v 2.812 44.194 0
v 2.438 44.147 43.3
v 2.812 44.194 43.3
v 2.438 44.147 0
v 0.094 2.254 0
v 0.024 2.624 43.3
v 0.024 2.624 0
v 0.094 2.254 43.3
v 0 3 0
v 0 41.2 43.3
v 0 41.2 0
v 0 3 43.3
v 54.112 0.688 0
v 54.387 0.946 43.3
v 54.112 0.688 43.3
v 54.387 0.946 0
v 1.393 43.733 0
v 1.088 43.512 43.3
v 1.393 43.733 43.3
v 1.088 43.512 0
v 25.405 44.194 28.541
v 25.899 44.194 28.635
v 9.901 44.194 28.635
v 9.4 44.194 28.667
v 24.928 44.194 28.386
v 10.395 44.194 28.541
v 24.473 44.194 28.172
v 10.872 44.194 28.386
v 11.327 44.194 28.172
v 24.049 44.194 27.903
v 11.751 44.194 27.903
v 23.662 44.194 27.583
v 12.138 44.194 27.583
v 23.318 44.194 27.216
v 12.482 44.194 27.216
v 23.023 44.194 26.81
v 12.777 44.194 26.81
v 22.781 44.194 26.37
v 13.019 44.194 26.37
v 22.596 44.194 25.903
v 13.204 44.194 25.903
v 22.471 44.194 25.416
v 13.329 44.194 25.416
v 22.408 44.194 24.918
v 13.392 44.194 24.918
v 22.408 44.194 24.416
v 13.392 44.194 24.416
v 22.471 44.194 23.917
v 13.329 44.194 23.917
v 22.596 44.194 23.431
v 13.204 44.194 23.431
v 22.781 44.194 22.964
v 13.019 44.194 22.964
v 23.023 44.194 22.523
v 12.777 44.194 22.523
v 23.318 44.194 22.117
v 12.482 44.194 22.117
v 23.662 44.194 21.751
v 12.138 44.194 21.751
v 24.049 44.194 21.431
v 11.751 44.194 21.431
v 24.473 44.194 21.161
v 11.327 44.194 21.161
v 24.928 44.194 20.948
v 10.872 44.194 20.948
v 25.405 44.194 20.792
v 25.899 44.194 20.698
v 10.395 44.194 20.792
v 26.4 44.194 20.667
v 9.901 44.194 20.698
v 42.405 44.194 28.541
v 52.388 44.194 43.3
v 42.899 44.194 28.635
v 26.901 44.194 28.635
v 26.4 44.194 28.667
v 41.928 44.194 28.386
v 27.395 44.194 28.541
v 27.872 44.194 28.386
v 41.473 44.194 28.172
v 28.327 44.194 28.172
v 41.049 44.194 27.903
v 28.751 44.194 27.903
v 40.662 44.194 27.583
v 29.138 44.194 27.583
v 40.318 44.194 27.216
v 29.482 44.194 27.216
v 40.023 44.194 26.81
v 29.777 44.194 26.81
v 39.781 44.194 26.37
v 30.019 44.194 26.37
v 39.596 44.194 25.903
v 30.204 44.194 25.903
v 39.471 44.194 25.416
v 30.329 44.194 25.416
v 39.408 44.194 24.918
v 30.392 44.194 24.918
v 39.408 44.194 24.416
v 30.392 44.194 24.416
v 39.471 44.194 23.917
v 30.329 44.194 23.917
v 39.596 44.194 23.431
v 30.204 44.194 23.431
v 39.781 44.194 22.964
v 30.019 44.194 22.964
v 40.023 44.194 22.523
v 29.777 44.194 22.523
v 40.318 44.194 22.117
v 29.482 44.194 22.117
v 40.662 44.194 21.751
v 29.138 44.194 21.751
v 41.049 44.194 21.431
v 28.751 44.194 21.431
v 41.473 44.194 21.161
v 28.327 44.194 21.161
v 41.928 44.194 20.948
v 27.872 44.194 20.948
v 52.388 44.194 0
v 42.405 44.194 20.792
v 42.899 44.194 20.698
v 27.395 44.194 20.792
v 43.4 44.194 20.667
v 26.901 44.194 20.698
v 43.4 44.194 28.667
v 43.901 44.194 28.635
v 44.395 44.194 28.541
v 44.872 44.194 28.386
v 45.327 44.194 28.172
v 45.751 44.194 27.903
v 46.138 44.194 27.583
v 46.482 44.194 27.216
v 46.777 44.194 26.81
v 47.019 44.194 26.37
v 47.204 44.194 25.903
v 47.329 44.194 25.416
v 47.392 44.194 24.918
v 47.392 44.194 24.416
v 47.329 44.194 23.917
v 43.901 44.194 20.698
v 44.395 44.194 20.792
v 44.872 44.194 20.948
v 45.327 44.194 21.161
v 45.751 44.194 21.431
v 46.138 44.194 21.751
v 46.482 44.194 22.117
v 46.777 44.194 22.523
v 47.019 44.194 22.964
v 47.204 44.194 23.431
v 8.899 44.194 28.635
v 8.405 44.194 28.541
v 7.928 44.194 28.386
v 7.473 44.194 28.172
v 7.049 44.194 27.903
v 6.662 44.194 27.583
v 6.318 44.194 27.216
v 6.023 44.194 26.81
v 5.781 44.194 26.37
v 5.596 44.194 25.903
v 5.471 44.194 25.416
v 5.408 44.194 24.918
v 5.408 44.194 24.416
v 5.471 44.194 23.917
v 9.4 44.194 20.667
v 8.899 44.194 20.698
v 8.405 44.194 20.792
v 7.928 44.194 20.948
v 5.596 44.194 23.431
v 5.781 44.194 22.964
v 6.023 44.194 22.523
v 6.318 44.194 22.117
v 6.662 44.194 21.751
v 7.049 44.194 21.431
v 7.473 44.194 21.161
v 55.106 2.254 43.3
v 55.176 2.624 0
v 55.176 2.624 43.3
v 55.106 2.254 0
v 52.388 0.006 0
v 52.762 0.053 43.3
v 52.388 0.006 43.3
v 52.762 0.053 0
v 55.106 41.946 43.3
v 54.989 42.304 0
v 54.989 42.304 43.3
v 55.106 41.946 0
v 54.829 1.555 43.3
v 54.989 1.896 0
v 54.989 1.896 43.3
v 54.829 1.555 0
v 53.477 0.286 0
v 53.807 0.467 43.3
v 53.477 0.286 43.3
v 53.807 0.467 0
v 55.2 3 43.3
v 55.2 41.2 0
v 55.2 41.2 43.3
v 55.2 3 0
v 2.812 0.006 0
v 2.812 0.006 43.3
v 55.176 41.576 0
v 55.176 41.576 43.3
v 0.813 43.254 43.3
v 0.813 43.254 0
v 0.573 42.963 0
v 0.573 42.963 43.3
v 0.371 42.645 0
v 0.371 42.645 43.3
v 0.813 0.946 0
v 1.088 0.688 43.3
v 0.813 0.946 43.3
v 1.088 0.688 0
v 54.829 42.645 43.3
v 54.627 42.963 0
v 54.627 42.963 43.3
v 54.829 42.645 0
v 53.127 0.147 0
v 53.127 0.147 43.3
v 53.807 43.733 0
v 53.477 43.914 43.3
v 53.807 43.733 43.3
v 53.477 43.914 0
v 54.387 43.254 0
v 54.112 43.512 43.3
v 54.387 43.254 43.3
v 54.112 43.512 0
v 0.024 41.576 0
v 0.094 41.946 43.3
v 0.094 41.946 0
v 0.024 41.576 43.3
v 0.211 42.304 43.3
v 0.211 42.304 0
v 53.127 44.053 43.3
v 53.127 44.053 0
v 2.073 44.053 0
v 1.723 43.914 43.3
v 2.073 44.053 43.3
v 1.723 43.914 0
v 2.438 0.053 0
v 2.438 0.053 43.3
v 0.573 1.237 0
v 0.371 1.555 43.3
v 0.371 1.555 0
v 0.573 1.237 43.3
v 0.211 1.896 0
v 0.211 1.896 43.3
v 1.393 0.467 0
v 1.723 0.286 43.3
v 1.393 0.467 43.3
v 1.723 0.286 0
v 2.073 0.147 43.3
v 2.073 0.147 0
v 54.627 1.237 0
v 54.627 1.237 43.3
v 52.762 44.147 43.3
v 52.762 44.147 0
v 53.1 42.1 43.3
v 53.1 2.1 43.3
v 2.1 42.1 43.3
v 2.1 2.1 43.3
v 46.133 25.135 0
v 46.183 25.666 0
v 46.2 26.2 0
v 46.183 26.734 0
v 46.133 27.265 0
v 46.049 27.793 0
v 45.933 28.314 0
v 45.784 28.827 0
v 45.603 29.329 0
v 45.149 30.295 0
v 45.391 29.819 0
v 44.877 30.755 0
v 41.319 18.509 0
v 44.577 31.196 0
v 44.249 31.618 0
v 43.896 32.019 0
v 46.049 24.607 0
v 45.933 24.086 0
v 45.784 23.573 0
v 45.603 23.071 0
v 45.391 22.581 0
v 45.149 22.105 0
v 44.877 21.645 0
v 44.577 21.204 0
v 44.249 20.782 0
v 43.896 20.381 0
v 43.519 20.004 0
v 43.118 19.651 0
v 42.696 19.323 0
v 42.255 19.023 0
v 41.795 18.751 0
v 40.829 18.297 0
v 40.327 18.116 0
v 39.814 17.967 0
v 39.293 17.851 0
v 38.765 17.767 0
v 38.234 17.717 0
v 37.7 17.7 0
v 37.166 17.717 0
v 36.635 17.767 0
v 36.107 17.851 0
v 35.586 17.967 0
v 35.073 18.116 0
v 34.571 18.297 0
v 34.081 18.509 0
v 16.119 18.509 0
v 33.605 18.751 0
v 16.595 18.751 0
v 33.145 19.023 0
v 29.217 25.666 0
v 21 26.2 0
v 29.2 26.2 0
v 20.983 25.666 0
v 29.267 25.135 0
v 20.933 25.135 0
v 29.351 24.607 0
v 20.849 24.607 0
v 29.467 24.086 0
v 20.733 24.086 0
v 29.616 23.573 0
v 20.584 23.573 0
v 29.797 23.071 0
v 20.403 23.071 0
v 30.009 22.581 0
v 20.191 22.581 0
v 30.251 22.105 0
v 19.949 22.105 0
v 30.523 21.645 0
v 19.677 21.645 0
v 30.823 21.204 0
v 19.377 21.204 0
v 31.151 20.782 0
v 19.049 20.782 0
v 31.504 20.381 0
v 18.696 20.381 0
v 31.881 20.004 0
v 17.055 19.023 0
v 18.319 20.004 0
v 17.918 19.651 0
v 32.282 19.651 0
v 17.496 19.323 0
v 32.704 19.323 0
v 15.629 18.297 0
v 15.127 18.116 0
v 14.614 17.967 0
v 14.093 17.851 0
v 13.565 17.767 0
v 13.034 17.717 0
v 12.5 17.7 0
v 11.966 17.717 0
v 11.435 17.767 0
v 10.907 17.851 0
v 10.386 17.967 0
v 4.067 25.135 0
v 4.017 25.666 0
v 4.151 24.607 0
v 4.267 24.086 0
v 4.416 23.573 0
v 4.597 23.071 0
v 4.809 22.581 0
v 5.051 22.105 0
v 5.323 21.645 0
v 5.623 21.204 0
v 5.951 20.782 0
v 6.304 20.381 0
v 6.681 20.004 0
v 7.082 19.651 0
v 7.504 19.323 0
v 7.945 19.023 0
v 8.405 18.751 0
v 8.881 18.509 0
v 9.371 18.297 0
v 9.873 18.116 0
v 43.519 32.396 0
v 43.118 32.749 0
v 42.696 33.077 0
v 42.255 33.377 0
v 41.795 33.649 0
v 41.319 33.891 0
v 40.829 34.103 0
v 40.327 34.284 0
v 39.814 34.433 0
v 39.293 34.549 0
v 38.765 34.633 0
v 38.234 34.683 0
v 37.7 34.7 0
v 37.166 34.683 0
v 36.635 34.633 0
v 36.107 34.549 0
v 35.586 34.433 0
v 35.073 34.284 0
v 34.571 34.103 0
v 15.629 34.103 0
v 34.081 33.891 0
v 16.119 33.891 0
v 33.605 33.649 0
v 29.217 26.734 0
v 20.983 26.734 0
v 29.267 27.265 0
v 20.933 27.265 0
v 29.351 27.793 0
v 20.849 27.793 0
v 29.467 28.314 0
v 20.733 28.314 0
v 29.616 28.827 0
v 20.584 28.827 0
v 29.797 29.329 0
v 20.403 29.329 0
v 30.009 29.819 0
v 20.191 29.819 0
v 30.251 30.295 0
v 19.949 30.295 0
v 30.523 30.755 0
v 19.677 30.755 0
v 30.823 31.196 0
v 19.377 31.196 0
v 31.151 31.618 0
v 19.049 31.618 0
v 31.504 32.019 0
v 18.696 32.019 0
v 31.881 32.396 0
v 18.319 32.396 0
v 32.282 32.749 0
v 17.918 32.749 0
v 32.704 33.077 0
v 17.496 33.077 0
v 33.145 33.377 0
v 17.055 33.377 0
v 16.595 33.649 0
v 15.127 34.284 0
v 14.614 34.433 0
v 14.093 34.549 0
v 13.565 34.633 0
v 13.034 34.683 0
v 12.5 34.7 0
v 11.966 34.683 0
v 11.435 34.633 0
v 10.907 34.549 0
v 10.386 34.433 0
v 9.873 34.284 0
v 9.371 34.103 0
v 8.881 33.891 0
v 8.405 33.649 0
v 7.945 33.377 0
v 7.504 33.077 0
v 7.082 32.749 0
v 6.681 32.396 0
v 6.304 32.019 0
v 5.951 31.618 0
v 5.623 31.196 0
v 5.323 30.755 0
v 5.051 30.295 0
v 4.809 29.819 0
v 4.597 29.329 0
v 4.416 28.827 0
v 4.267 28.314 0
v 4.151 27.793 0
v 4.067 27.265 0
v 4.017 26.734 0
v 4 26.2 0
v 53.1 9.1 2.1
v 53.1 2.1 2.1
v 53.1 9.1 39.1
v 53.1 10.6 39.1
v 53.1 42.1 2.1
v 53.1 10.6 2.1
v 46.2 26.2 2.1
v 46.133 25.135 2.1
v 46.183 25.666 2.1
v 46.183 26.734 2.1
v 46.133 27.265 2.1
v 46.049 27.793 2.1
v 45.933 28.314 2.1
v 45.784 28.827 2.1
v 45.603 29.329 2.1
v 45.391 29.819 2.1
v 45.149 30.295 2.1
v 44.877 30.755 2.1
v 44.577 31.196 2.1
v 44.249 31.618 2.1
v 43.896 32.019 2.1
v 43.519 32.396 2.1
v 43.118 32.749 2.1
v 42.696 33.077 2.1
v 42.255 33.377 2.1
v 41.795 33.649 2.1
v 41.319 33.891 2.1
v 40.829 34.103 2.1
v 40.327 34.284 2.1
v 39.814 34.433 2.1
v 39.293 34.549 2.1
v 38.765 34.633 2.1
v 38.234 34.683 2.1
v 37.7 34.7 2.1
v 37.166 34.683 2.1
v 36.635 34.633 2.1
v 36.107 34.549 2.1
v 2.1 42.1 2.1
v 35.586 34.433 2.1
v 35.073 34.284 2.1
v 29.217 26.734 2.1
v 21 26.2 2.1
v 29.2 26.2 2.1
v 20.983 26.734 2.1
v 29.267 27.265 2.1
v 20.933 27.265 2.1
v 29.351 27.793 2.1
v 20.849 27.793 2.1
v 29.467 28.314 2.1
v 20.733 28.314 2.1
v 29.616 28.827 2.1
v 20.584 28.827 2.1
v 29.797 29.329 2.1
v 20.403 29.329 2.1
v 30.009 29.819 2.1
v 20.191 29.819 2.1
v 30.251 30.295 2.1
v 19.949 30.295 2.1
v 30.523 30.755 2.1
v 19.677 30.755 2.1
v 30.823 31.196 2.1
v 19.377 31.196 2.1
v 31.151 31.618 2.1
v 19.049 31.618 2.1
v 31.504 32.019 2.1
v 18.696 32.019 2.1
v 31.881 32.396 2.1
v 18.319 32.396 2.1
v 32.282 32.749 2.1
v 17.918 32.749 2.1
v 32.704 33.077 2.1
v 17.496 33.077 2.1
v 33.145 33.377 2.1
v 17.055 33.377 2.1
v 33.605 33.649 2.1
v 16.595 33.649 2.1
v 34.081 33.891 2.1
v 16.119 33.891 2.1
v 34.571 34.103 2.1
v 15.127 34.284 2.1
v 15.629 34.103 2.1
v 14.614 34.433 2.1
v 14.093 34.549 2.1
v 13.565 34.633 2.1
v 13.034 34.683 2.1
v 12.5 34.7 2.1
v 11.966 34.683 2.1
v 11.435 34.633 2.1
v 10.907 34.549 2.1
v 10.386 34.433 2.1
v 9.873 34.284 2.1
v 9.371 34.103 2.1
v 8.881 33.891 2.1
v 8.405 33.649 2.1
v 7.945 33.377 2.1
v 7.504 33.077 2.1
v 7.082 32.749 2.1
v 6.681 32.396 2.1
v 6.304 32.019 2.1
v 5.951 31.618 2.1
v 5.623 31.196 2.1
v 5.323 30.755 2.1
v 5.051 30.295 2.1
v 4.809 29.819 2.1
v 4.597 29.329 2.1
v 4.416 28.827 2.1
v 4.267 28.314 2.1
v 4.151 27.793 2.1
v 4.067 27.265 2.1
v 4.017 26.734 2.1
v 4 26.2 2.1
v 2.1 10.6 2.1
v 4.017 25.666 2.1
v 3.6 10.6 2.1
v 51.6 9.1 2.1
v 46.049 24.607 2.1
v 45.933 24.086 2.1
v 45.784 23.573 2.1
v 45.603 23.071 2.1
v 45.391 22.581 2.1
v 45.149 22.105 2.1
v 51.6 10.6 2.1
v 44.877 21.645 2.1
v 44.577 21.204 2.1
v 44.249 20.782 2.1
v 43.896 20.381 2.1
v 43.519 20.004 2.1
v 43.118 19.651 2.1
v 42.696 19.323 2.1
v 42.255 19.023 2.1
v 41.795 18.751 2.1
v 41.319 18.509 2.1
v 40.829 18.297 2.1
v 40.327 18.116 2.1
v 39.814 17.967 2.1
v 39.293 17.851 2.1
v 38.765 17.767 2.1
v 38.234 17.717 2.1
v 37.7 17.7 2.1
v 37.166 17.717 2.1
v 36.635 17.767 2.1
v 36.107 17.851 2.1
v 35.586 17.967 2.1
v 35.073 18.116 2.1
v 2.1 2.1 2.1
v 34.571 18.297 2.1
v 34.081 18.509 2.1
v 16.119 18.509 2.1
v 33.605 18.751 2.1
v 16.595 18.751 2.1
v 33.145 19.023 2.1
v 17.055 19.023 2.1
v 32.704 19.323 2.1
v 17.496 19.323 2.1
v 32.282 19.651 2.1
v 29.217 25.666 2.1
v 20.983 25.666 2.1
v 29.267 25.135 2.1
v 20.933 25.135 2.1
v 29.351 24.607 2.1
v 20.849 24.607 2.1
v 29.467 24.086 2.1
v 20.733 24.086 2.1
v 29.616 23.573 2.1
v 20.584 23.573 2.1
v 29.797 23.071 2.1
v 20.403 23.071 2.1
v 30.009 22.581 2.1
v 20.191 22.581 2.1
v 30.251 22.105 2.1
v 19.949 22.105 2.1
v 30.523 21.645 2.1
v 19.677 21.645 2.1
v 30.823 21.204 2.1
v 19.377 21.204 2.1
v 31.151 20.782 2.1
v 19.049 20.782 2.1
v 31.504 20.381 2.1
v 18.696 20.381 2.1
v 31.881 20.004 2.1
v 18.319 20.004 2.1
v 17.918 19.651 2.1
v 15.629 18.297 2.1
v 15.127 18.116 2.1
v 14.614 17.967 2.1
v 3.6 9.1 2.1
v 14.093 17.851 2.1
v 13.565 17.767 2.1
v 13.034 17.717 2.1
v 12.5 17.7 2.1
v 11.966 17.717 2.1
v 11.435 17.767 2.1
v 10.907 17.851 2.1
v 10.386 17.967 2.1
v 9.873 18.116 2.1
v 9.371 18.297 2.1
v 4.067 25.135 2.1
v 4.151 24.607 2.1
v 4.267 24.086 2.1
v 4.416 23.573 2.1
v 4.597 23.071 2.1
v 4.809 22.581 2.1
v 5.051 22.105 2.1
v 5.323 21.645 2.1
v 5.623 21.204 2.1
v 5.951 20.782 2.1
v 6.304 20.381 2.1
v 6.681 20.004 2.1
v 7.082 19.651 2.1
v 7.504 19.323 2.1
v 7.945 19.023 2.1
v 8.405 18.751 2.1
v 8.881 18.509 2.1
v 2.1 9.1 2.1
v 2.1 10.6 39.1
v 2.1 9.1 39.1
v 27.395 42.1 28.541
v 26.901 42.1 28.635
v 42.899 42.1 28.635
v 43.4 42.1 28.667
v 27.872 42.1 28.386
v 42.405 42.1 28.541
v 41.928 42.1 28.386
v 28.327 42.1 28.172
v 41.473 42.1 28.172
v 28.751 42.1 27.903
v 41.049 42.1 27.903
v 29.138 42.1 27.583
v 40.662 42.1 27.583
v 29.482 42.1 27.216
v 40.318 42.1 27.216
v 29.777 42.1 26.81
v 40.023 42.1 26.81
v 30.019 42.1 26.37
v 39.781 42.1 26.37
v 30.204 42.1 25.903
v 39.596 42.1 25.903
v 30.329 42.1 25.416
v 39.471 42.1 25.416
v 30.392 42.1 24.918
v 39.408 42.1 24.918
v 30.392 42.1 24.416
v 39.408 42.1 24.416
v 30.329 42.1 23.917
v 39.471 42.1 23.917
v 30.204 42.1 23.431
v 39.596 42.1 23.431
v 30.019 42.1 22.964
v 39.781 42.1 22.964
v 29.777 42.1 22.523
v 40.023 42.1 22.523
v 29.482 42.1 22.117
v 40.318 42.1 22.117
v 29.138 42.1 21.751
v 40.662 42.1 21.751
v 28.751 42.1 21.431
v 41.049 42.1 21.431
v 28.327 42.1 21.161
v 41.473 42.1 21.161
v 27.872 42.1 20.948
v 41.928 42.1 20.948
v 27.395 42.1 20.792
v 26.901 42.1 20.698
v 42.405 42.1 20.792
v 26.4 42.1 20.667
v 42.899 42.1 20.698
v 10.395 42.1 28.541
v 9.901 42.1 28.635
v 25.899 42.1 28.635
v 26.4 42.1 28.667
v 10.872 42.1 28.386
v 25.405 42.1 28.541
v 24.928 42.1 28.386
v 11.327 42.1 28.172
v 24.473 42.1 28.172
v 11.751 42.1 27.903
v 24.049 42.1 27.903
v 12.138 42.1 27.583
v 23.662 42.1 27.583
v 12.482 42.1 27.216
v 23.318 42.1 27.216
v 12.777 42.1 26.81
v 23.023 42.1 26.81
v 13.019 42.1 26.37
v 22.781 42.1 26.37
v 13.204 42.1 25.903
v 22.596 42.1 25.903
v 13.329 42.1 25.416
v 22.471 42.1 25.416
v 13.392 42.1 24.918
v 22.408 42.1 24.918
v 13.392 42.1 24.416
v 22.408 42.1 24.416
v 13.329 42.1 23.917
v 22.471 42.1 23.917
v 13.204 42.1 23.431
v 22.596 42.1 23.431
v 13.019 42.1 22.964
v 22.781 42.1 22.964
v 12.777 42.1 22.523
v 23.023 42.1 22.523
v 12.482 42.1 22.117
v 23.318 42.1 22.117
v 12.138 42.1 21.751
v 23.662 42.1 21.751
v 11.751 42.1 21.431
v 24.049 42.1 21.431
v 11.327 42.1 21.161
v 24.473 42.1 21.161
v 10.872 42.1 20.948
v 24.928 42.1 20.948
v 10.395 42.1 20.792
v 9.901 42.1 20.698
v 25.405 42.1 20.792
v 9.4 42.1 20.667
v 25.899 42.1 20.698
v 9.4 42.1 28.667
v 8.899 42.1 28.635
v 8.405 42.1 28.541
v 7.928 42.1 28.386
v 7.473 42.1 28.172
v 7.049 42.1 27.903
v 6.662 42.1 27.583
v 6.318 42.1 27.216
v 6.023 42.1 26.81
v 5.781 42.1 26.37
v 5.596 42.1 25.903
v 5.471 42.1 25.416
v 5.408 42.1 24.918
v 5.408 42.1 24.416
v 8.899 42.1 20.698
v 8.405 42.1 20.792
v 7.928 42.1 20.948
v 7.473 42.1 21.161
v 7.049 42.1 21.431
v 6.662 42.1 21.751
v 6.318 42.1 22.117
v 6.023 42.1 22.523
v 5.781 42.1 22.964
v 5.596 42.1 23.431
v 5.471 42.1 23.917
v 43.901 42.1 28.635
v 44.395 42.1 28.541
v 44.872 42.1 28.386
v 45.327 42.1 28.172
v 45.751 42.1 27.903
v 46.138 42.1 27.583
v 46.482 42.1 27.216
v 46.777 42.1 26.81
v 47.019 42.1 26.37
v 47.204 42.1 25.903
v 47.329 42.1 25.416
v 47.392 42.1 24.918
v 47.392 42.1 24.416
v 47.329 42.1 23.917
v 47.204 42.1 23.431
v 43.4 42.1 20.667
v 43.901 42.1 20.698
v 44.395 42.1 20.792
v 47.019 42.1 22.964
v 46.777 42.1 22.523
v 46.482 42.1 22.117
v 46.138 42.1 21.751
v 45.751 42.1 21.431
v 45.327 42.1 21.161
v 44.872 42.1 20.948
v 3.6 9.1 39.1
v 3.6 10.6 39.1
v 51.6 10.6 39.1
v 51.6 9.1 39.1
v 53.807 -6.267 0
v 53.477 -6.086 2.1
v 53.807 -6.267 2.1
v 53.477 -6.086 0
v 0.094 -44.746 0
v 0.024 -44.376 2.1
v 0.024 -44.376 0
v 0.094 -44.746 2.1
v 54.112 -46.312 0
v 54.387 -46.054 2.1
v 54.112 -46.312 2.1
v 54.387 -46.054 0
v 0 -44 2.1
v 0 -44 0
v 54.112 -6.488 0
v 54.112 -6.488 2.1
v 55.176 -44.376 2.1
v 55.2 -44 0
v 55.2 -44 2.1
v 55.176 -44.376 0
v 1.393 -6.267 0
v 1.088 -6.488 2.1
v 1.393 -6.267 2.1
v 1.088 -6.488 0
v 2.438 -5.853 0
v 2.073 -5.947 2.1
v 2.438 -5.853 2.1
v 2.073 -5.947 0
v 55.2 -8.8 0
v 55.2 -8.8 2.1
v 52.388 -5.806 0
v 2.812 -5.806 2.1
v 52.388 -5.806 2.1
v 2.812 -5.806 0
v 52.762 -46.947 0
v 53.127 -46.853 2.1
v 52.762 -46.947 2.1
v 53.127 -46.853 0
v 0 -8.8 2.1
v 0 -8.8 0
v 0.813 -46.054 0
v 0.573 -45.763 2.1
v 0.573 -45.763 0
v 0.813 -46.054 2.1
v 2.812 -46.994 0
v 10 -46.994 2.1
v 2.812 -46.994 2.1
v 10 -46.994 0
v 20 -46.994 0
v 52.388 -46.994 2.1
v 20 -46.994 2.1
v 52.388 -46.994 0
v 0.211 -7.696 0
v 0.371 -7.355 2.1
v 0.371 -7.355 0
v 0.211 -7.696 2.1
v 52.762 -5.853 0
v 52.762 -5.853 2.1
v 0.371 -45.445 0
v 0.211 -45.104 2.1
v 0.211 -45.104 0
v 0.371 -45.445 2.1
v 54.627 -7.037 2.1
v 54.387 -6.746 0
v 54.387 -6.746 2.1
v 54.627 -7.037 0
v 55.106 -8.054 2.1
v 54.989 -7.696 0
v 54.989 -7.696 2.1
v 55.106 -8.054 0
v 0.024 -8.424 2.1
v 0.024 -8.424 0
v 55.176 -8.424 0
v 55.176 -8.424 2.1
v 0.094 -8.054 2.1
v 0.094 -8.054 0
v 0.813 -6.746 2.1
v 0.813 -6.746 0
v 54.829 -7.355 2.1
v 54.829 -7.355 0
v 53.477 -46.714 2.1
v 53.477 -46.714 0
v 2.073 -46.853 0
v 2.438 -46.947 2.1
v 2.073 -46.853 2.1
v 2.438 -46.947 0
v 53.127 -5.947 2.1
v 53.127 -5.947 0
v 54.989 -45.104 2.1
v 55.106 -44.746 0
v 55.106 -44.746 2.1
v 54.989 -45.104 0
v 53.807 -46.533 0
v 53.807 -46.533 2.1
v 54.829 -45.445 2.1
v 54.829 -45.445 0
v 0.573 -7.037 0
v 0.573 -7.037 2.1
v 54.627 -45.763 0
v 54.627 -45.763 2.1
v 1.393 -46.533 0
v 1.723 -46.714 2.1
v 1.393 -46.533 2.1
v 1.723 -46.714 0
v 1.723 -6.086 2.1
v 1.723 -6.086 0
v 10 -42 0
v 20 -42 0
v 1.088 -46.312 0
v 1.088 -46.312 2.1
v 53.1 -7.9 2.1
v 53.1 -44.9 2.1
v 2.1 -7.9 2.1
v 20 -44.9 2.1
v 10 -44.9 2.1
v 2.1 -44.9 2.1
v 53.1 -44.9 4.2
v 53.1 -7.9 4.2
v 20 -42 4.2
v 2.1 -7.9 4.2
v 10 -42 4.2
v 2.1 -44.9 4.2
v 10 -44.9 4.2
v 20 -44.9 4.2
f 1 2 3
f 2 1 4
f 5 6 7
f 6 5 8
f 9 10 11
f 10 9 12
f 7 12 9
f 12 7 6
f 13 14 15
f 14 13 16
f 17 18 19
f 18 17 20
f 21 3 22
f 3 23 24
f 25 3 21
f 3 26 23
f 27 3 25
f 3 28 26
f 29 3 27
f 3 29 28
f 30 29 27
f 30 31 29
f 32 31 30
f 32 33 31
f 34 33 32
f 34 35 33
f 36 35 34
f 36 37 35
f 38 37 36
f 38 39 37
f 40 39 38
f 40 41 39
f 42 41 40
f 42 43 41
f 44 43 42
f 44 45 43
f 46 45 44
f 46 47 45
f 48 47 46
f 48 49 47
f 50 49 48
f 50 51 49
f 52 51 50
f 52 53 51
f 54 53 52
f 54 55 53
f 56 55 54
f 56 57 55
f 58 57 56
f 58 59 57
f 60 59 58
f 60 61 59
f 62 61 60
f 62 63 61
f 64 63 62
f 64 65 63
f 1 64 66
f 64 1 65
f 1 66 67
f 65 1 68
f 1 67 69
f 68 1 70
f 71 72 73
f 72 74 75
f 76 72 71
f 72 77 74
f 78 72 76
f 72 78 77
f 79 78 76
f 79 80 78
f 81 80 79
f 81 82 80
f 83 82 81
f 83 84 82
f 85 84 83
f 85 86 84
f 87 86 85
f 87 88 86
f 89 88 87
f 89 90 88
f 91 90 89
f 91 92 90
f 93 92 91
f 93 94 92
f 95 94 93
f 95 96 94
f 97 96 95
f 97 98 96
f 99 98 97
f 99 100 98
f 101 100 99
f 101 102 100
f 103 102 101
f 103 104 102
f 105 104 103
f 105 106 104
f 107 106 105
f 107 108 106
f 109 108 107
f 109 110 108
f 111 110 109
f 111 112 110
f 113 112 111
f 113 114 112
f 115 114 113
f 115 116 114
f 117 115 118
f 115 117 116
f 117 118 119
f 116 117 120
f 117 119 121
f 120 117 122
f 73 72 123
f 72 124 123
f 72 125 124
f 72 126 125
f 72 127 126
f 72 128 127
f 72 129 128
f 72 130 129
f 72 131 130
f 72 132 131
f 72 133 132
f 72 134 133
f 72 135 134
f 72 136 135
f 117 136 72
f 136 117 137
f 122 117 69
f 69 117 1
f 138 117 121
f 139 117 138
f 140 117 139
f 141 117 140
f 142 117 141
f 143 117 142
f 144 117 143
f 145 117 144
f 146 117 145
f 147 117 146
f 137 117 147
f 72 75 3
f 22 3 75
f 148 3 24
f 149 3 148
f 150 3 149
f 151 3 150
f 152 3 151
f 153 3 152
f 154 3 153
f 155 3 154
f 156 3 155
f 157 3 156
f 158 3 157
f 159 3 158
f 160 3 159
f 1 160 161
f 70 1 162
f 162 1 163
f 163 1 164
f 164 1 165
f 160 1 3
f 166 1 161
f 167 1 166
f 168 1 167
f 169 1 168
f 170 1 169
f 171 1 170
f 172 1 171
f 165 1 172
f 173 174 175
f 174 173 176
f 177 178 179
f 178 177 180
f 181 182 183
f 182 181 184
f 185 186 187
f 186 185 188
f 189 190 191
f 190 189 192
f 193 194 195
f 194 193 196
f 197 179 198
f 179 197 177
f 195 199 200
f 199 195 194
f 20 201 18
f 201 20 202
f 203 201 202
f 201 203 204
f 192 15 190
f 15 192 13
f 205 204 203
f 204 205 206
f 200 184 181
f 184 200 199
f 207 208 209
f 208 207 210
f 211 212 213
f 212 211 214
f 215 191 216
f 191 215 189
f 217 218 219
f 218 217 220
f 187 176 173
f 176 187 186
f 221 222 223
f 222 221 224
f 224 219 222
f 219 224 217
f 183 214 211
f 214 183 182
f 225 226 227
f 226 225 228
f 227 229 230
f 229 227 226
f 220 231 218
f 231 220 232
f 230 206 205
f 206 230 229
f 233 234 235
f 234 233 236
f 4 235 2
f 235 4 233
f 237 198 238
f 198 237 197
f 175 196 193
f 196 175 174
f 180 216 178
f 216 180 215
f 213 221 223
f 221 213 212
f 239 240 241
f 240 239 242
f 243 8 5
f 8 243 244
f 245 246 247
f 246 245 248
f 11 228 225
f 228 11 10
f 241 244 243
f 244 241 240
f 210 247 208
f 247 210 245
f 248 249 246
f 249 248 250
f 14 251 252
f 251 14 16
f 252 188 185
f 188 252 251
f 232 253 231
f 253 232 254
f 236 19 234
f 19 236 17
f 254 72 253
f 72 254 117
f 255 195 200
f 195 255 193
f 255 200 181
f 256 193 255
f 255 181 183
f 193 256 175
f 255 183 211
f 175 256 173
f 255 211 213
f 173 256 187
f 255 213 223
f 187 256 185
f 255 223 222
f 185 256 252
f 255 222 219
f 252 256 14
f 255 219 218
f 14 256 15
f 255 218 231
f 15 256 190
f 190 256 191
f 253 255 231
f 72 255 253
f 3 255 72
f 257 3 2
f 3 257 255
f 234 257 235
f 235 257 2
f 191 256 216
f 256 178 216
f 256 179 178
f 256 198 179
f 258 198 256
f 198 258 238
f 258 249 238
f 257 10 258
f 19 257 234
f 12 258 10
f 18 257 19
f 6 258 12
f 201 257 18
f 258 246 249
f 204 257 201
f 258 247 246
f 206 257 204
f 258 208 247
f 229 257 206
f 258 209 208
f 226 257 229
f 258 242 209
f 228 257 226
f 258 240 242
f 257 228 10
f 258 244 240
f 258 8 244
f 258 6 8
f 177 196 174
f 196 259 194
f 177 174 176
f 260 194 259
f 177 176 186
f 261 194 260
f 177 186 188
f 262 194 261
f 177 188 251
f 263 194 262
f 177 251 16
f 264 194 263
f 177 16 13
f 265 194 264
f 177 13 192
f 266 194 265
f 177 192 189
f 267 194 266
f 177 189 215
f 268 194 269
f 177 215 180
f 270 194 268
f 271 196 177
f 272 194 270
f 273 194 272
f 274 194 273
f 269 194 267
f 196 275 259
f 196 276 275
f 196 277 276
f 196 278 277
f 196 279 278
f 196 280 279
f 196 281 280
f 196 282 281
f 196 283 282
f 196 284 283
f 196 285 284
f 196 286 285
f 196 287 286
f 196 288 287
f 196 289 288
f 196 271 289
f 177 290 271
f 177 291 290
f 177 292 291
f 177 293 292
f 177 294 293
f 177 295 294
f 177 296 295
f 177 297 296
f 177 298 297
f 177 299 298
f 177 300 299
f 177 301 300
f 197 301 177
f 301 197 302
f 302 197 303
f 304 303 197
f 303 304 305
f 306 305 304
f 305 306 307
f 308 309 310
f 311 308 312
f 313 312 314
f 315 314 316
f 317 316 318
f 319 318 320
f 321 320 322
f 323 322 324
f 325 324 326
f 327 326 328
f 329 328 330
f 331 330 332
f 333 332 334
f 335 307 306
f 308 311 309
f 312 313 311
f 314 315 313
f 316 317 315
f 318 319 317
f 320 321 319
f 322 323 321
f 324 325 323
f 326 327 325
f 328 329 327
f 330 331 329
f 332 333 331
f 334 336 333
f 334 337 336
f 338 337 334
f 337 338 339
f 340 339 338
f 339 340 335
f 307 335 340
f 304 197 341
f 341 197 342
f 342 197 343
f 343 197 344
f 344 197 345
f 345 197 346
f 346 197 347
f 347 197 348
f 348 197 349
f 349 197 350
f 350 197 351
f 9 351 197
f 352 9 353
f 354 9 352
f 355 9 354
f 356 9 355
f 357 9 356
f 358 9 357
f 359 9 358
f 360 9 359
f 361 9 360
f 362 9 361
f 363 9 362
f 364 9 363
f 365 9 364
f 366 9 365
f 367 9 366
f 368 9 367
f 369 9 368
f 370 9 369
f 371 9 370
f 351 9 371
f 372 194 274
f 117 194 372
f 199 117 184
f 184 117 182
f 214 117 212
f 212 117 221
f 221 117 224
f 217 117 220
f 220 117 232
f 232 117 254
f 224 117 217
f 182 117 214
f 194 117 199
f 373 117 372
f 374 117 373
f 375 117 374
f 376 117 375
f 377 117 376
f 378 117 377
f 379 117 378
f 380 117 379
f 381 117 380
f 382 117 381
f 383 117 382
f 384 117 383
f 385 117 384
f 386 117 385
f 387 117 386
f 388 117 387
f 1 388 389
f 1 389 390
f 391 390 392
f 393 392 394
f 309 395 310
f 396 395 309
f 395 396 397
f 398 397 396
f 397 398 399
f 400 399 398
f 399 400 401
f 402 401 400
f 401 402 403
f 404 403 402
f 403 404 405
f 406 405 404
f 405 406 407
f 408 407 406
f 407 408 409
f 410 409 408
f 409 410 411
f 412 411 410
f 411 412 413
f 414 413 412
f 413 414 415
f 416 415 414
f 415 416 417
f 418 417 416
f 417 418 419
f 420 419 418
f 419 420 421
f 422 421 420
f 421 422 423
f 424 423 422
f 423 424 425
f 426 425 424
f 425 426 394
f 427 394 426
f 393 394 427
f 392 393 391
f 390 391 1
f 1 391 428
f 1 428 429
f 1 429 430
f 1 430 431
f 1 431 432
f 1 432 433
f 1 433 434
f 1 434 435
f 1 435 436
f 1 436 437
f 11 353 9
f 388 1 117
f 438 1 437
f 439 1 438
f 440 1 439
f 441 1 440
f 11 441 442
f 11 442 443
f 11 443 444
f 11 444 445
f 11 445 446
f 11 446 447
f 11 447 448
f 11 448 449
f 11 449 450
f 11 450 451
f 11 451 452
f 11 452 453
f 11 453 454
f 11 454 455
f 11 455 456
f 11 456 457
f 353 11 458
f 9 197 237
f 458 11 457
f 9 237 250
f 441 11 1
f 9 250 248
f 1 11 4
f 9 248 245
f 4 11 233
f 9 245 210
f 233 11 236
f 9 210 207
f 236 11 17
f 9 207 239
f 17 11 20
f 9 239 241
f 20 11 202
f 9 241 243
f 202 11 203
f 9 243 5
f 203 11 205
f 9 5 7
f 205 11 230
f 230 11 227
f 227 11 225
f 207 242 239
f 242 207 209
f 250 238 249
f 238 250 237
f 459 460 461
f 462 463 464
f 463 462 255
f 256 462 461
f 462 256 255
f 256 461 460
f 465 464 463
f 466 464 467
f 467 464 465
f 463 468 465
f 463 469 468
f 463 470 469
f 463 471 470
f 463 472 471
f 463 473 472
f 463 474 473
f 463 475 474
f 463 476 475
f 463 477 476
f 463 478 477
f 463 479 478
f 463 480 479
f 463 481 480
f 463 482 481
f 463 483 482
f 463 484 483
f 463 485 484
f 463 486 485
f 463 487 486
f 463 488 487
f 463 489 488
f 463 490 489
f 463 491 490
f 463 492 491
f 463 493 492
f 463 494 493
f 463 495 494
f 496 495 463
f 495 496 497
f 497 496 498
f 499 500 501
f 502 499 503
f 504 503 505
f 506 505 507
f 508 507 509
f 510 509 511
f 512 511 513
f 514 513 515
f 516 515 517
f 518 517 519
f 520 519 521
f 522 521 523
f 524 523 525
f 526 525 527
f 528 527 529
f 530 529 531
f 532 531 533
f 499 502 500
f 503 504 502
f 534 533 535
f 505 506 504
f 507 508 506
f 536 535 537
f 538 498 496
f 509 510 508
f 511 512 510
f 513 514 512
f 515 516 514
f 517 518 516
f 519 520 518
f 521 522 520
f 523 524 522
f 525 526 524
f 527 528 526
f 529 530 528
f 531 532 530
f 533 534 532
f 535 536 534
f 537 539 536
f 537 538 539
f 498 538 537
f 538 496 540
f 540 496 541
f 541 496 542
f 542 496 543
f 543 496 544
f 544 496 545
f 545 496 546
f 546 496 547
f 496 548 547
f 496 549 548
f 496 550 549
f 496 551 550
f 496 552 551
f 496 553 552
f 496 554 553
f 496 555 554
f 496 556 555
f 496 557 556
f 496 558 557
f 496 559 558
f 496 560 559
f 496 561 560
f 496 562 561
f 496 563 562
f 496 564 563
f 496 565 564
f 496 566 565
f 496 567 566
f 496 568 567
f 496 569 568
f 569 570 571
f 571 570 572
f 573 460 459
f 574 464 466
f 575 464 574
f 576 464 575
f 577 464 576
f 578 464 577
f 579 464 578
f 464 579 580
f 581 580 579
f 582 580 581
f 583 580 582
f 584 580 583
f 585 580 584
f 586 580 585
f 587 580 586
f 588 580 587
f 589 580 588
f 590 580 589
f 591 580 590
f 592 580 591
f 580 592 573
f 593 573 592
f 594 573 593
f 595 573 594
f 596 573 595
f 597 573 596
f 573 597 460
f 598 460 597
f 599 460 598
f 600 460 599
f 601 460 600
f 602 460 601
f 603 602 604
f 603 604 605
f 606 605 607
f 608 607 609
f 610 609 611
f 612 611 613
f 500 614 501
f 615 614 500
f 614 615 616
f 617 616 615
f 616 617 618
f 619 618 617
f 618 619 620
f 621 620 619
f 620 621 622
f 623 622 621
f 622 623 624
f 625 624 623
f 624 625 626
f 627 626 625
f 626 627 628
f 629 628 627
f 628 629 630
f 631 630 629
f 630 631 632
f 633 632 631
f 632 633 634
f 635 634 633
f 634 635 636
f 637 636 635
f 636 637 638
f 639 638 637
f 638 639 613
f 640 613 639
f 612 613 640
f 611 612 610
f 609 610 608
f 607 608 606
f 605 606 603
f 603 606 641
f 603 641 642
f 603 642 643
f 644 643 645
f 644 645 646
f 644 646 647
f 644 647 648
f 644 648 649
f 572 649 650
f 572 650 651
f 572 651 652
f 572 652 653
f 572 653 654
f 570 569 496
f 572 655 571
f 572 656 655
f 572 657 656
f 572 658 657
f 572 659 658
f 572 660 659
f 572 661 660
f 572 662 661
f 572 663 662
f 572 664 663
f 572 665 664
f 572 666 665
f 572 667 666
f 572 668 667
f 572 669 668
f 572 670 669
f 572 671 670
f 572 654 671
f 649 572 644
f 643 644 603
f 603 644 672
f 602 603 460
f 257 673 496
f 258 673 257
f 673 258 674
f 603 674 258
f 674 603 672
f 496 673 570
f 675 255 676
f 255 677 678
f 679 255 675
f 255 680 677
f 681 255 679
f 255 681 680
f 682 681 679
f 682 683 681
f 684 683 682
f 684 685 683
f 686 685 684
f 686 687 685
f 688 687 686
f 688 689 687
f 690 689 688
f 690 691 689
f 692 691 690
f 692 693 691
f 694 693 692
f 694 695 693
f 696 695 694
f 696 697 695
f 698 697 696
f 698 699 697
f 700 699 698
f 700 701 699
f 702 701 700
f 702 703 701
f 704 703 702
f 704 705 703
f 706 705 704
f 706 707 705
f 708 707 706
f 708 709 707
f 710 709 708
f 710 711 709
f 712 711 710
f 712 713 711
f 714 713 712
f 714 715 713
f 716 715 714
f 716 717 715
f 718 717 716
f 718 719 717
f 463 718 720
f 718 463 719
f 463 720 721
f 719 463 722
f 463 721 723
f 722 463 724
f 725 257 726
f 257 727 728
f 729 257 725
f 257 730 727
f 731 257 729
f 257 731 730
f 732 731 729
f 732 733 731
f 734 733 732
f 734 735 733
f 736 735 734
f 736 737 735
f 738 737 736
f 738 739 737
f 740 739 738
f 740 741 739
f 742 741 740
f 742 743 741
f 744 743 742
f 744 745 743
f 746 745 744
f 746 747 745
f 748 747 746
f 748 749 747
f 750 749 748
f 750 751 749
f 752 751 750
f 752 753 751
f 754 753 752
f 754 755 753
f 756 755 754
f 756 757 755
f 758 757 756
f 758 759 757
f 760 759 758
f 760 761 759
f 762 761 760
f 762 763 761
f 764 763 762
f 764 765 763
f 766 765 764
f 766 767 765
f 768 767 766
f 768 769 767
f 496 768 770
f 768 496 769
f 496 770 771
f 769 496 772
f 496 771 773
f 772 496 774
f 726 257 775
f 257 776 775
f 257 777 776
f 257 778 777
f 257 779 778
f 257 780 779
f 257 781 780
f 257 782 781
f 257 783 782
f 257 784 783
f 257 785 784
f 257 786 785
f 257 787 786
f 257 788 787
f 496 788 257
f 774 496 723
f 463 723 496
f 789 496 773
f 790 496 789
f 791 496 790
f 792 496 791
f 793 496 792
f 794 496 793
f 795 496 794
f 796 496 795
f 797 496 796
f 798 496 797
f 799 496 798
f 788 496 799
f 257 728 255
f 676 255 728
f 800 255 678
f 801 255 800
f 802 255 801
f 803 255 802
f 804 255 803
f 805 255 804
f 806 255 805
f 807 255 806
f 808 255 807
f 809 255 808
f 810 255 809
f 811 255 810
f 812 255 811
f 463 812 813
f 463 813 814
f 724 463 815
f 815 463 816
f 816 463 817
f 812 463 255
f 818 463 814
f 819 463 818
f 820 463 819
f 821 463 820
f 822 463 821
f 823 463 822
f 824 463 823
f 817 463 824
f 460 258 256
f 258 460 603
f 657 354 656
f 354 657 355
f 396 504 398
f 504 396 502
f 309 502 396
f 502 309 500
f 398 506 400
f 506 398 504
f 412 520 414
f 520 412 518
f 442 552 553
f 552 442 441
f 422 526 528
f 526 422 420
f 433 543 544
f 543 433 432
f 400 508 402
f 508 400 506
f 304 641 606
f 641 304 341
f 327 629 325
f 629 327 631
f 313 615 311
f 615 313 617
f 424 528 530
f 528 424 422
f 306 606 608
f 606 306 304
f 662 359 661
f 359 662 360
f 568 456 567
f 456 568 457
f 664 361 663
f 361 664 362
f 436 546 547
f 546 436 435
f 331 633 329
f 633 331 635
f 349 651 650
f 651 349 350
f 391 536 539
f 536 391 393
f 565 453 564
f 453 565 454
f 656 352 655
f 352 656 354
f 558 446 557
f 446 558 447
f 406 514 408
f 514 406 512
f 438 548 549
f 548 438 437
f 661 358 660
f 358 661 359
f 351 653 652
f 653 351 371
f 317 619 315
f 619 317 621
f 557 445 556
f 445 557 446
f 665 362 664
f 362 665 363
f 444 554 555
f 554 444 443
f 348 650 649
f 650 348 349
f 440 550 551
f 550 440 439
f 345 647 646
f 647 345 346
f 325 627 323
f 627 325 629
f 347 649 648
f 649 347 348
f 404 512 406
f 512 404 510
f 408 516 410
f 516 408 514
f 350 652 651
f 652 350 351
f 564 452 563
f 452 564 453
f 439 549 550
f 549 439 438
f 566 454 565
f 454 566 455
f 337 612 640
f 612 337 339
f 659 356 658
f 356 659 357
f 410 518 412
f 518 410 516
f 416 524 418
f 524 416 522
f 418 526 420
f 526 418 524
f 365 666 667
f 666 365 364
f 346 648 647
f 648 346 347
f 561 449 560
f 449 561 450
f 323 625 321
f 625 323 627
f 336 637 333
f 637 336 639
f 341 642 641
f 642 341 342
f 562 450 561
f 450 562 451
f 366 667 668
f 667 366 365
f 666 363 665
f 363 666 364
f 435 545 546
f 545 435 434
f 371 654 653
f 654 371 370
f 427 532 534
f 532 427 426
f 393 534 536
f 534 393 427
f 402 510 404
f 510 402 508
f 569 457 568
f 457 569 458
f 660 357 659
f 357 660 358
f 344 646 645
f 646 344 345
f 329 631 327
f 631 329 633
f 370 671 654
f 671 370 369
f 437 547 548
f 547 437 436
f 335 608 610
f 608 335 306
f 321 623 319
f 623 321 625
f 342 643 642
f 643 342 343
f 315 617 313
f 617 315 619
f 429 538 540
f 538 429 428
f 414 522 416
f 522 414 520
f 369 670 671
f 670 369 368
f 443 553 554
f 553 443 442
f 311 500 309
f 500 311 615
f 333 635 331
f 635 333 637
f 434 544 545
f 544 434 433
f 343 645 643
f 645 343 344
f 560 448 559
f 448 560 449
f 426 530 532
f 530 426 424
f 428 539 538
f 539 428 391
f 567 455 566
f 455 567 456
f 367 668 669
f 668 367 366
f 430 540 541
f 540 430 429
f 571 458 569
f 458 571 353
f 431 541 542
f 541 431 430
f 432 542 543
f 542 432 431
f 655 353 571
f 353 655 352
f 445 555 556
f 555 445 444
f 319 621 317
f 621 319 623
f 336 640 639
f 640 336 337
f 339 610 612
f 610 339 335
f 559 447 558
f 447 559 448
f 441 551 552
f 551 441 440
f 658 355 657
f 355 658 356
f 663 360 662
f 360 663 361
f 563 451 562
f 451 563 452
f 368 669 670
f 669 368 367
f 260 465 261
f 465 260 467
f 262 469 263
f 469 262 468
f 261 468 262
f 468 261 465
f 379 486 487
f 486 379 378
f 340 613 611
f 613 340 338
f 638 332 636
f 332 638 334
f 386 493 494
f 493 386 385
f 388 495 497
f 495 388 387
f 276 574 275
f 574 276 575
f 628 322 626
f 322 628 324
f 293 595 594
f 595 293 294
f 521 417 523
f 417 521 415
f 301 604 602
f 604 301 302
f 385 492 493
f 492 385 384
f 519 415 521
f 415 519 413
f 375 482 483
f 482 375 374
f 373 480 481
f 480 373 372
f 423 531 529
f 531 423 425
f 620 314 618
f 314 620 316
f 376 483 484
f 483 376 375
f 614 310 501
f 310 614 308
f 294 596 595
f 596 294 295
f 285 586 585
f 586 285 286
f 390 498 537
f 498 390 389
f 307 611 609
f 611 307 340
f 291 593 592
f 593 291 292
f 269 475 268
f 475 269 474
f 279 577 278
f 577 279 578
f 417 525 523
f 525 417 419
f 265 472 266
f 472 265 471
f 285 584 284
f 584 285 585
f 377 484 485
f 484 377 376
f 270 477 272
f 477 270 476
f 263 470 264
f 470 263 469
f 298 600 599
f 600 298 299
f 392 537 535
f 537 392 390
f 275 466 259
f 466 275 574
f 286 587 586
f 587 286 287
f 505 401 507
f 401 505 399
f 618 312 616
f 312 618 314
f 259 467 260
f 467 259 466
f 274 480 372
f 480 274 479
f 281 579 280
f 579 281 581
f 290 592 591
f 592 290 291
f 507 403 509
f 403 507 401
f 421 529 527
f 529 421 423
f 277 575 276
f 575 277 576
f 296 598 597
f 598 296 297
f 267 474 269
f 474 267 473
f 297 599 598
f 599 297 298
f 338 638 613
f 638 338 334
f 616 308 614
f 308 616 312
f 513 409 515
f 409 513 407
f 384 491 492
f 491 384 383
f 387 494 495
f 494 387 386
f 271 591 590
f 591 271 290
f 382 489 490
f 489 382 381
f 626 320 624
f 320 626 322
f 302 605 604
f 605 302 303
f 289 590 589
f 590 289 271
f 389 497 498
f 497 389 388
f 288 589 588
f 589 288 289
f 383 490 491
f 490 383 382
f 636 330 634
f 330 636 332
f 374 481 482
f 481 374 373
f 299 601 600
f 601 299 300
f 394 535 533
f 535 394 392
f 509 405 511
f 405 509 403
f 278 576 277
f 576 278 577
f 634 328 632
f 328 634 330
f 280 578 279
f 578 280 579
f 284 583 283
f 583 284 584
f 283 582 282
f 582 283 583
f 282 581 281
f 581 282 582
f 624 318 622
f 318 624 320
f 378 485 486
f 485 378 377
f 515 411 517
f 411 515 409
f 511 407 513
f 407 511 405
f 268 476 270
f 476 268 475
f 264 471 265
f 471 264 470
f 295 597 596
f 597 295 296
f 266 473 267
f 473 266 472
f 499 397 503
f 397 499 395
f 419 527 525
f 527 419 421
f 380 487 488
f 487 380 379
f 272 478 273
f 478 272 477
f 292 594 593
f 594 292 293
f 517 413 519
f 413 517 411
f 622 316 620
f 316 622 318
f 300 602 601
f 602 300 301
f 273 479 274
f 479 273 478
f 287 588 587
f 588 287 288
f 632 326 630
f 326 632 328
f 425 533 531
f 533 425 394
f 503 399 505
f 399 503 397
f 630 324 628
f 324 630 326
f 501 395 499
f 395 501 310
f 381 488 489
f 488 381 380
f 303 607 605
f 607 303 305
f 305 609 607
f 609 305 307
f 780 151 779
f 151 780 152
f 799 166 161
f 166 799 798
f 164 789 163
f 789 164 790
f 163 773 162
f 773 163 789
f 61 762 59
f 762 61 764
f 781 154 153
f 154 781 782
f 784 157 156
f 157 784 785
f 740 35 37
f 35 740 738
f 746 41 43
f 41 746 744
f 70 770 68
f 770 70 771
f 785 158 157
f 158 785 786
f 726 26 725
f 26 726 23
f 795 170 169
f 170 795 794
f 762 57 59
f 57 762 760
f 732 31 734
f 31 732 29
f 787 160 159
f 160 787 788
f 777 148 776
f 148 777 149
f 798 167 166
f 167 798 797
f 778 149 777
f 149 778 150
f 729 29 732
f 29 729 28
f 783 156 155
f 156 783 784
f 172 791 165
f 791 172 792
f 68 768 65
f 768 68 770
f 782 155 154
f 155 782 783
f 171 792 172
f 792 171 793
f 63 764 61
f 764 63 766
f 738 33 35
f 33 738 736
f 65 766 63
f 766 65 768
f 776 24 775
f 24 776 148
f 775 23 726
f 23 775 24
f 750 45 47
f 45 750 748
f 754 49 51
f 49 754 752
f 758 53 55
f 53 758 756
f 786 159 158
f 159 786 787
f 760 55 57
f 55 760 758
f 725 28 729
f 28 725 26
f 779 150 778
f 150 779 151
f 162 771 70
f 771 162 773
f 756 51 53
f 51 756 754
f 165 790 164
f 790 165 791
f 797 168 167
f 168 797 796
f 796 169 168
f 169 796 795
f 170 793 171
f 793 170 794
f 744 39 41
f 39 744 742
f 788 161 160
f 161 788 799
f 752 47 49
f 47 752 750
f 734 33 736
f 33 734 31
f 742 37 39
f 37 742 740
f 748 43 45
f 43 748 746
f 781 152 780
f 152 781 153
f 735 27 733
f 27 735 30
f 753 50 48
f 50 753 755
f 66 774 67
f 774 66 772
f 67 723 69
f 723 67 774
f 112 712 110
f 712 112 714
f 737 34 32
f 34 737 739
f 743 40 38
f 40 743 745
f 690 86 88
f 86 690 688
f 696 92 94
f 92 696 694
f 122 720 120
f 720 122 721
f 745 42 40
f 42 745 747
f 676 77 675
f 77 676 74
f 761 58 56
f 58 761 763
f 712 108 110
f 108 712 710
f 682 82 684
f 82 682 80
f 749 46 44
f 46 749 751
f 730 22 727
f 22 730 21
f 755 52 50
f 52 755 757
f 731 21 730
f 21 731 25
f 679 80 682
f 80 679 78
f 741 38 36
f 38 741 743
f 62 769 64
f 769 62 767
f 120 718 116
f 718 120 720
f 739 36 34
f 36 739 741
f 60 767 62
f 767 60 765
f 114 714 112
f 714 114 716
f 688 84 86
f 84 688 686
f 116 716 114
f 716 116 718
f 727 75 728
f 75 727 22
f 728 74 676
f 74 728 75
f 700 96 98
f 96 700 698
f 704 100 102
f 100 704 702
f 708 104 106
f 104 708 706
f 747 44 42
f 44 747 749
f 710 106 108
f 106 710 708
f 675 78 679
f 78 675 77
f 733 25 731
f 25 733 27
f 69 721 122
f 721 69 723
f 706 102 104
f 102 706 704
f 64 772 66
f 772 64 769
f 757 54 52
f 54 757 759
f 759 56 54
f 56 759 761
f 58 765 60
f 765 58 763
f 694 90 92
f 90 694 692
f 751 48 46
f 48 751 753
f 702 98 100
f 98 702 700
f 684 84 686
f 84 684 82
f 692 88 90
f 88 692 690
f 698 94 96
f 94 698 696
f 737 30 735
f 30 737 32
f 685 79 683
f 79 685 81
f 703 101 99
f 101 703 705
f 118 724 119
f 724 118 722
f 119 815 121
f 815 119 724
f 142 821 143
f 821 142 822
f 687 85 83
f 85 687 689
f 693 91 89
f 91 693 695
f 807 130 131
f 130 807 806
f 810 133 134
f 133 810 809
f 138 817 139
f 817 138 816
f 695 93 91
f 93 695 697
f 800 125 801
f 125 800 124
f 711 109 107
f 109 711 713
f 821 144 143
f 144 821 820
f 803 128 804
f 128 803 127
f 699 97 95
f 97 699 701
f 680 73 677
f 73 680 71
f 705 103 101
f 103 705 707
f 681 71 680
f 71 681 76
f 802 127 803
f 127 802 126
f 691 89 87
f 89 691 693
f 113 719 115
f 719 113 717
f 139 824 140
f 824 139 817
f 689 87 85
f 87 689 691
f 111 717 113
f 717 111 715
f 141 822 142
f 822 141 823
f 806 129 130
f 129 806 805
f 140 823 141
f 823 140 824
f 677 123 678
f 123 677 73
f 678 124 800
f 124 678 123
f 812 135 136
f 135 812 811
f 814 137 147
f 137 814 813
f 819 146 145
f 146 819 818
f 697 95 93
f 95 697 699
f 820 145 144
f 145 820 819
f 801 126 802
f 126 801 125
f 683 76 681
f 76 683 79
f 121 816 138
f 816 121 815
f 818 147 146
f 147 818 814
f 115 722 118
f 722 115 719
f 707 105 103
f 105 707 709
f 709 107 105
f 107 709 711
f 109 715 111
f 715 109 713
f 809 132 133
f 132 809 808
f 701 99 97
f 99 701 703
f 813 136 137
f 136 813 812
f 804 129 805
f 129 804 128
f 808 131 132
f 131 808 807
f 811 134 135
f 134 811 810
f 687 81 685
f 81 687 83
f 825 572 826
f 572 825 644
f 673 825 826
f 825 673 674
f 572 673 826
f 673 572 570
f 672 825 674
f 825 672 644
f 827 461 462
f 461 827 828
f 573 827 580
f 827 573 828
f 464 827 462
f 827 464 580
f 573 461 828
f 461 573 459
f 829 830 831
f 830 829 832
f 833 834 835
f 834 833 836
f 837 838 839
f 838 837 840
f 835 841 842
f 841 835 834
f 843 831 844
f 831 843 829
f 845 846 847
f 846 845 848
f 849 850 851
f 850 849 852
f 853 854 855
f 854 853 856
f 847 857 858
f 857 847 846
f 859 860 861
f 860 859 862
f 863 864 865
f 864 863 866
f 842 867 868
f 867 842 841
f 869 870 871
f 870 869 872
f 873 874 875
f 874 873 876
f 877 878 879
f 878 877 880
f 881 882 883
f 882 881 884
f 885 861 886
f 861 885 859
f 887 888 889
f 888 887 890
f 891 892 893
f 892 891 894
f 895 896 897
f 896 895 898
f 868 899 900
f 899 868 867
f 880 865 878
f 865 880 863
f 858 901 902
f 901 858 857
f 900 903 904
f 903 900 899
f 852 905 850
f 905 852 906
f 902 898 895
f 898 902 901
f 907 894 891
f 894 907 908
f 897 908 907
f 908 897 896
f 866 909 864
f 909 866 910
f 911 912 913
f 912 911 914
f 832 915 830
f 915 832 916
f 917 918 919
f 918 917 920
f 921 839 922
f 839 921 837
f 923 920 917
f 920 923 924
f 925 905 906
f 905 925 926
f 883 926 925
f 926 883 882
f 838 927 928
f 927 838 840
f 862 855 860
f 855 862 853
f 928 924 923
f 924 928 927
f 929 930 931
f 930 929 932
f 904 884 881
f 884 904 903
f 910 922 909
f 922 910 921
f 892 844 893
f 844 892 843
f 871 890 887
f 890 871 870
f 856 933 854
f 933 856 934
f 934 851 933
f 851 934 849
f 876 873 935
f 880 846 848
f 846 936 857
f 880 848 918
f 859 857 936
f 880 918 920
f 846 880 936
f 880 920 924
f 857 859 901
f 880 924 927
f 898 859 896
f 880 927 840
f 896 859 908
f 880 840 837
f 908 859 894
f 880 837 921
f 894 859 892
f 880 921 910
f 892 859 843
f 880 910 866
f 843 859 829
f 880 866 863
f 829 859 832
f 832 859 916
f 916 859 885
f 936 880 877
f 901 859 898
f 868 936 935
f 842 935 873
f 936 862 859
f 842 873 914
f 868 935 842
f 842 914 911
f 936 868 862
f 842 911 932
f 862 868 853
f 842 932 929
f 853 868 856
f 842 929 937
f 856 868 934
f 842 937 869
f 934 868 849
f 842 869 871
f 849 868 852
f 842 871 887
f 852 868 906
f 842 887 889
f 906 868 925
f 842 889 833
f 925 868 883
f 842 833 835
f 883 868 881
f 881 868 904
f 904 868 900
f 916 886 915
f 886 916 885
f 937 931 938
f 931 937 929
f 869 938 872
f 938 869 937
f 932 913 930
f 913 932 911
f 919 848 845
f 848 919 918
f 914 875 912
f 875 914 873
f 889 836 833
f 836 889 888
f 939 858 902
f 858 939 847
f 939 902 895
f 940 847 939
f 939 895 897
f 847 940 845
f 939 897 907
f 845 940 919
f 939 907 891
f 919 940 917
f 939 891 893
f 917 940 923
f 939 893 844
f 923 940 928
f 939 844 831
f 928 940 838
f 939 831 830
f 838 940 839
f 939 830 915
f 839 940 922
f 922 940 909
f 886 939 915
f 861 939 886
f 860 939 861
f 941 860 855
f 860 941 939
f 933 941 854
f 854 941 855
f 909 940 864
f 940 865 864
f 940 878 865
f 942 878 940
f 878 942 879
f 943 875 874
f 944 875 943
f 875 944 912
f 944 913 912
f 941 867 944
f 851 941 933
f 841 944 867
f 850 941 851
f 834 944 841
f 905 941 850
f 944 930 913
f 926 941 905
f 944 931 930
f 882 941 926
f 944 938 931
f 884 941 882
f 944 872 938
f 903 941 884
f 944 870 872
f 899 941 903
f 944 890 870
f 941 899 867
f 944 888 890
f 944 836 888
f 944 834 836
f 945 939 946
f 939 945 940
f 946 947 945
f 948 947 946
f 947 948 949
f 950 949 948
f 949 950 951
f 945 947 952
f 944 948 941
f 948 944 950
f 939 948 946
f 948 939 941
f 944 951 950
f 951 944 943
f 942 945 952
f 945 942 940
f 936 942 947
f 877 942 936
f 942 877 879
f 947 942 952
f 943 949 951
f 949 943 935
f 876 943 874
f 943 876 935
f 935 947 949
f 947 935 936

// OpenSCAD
// file: toolbox.scad
/********************************************
Einige Hilfsmodule für die 3D-Druck Konstrukte
Copyright (c) 2018 by G. Weirich
*********************************************/
/*
    Viereckige Dose. Parameter: Innenmasse, Wanddicke
*/
module box(inner_size,thick){
    difference(){
        cube([inner_size.x+2*thick,inner_size.y+2*thick,inner_size.z+2*thick]);
        translate([thick,thick,thick])
            cube([inner_size.x,inner_size.y,inner_size.z+2*thick]);
    }
}

/*
    Deckel für Box
*/
module cover(inner_size,thick){
  cube([inner_size.x+2*thick,  inner_size.y+2*thick, thick]);
  translate([thick,thick,thick])
        cube([inner_size.x,inner_size.y,thick]);
}
/*
    Viereckige Dose mit gerundeten Ecken
    Parameter: Innenmasse, Radius der Eckenrundungen, Wanddicke
*/
module roundedBox(inner_size,radius,thick){
    difference(){
        roundedRect([inner_size.x+2*thick,inner_size.y+2*thick,inner_size.z+2*thick],radius);
        translate([thick,thick,thick])
            cube([inner_size.x,inner_size.y,inner_size.z+2*thick]);
    }
}

/*
    Eine Strecke innerhalb einer anderen Strecke zentrieren.
    Parameter: Länge der äusseren Strecke, Länge der inneren Strecke.
*/
function center(outer,inner)=(outer-inner)/2;

/*
    cube mit gerundeten Ecken.
    Parameter: Aussenmasse, Radius der Eckenrundungen.
*/
module roundedRect(size, radius,steps=50)
{
    x = size[0];
    y = size[1];
    z = size[2];
    linear_extrude(height=z)
        hull(){
            translate([radius, radius, 0])
            circle(r=radius,$fn=steps);

            translate([x-radius, radius, 0])
            circle(r=radius, $fn=steps);

            translate([x-radius, y-radius, 0])
            circle(r=radius,$fn=steps);

            translate([radius, y-radius, 0])
            circle(r=radius,$fn=steps);
            
        }

}

/*
    Deckel für gerundete Box
*/
module roundedCover(inner_size,radius,thick){
  roundedRect([inner_size.x+2*thick,  inner_size.y+2*thick, thick],radius);
  translate([thick,thick,thick])
        cube([inner_size.x,inner_size.y,thick]);
}
// main file
/**********************************************************
    Gehäuse für einen HC-SR04 oder 05 Ultraschall Sensor, 
    einen Arduino Nano und 3 LEDs
    
    Schichtdicke: 0.3 mm, Filament PLA 1.75 mm
*********************************************************/
include <toolbox.scad>

thick=2.1;           // Wanddicke. 
length=46+2*thick;
width=21+2*thick;
depth=17+thick;
diameter=17;        // Durchmesser der Sender/Empfänger
offset=1.9;             // Abstand Sender/Empfänger von Wand
steps=100;           // Schritte für Kreisberechnung
platine_t=1.5;
platine_w=37;
platine_l=51;
clearance_floor=7;
racksize=1.5;
level_y=clearance_floor+thick+platine_t+racksize;
ledsize=8;

/*
    Die Box
*/    
union(){
    difference(){
         roundedBox([platine_l,40,platine_w+thick],3,thick);  
         translate([
                diameter/2+offset+thick,
                diameter/2+center(width,diameter)+level_y+platine_t,
                -offset])
                    cylinder(r=diameter/2,h=depth+5,$fn=steps);
         translate([length-diameter/2-offset-thick,
                    diameter/2+center(width,diameter)+level_y+platine_t,
                    -offset])
                    cylinder(r=diameter/2,h=depth+5,$fn=steps);
        ledspace=platine_l/3;
        ledoffs=3+center(ledspace,ledsize)+ledsize/2;
        led(ledoffs);
        led(ledspace+ledoffs);
        led(2*ledspace+ledoffs);
    }

    rack([thick,clearance_floor+thick,thick]);
    rack([platine_l+thick-racksize,clearance_floor+thick,thick]); 
}

/*
    Der Deckel
*/
union(){
        difference(){
            translate([0,-(platine_w+10),0]){
                roundedCover([platine_l,platine_w,0],3,thick);
            }
            translate([10,-(platine_w+10),0]){
                 cube([10,5,10]);
            }
        }
    
}
module led(x){
        translate([x-thick,platine_w,2*platine_w/3])
            rotate([0,90,90])
                cylinder(r=ledsize/2,h=10,$fn=50);           

}
    

module rack(pos){
translate(pos) 
    cube([racksize,racksize,platine_w]);

}
